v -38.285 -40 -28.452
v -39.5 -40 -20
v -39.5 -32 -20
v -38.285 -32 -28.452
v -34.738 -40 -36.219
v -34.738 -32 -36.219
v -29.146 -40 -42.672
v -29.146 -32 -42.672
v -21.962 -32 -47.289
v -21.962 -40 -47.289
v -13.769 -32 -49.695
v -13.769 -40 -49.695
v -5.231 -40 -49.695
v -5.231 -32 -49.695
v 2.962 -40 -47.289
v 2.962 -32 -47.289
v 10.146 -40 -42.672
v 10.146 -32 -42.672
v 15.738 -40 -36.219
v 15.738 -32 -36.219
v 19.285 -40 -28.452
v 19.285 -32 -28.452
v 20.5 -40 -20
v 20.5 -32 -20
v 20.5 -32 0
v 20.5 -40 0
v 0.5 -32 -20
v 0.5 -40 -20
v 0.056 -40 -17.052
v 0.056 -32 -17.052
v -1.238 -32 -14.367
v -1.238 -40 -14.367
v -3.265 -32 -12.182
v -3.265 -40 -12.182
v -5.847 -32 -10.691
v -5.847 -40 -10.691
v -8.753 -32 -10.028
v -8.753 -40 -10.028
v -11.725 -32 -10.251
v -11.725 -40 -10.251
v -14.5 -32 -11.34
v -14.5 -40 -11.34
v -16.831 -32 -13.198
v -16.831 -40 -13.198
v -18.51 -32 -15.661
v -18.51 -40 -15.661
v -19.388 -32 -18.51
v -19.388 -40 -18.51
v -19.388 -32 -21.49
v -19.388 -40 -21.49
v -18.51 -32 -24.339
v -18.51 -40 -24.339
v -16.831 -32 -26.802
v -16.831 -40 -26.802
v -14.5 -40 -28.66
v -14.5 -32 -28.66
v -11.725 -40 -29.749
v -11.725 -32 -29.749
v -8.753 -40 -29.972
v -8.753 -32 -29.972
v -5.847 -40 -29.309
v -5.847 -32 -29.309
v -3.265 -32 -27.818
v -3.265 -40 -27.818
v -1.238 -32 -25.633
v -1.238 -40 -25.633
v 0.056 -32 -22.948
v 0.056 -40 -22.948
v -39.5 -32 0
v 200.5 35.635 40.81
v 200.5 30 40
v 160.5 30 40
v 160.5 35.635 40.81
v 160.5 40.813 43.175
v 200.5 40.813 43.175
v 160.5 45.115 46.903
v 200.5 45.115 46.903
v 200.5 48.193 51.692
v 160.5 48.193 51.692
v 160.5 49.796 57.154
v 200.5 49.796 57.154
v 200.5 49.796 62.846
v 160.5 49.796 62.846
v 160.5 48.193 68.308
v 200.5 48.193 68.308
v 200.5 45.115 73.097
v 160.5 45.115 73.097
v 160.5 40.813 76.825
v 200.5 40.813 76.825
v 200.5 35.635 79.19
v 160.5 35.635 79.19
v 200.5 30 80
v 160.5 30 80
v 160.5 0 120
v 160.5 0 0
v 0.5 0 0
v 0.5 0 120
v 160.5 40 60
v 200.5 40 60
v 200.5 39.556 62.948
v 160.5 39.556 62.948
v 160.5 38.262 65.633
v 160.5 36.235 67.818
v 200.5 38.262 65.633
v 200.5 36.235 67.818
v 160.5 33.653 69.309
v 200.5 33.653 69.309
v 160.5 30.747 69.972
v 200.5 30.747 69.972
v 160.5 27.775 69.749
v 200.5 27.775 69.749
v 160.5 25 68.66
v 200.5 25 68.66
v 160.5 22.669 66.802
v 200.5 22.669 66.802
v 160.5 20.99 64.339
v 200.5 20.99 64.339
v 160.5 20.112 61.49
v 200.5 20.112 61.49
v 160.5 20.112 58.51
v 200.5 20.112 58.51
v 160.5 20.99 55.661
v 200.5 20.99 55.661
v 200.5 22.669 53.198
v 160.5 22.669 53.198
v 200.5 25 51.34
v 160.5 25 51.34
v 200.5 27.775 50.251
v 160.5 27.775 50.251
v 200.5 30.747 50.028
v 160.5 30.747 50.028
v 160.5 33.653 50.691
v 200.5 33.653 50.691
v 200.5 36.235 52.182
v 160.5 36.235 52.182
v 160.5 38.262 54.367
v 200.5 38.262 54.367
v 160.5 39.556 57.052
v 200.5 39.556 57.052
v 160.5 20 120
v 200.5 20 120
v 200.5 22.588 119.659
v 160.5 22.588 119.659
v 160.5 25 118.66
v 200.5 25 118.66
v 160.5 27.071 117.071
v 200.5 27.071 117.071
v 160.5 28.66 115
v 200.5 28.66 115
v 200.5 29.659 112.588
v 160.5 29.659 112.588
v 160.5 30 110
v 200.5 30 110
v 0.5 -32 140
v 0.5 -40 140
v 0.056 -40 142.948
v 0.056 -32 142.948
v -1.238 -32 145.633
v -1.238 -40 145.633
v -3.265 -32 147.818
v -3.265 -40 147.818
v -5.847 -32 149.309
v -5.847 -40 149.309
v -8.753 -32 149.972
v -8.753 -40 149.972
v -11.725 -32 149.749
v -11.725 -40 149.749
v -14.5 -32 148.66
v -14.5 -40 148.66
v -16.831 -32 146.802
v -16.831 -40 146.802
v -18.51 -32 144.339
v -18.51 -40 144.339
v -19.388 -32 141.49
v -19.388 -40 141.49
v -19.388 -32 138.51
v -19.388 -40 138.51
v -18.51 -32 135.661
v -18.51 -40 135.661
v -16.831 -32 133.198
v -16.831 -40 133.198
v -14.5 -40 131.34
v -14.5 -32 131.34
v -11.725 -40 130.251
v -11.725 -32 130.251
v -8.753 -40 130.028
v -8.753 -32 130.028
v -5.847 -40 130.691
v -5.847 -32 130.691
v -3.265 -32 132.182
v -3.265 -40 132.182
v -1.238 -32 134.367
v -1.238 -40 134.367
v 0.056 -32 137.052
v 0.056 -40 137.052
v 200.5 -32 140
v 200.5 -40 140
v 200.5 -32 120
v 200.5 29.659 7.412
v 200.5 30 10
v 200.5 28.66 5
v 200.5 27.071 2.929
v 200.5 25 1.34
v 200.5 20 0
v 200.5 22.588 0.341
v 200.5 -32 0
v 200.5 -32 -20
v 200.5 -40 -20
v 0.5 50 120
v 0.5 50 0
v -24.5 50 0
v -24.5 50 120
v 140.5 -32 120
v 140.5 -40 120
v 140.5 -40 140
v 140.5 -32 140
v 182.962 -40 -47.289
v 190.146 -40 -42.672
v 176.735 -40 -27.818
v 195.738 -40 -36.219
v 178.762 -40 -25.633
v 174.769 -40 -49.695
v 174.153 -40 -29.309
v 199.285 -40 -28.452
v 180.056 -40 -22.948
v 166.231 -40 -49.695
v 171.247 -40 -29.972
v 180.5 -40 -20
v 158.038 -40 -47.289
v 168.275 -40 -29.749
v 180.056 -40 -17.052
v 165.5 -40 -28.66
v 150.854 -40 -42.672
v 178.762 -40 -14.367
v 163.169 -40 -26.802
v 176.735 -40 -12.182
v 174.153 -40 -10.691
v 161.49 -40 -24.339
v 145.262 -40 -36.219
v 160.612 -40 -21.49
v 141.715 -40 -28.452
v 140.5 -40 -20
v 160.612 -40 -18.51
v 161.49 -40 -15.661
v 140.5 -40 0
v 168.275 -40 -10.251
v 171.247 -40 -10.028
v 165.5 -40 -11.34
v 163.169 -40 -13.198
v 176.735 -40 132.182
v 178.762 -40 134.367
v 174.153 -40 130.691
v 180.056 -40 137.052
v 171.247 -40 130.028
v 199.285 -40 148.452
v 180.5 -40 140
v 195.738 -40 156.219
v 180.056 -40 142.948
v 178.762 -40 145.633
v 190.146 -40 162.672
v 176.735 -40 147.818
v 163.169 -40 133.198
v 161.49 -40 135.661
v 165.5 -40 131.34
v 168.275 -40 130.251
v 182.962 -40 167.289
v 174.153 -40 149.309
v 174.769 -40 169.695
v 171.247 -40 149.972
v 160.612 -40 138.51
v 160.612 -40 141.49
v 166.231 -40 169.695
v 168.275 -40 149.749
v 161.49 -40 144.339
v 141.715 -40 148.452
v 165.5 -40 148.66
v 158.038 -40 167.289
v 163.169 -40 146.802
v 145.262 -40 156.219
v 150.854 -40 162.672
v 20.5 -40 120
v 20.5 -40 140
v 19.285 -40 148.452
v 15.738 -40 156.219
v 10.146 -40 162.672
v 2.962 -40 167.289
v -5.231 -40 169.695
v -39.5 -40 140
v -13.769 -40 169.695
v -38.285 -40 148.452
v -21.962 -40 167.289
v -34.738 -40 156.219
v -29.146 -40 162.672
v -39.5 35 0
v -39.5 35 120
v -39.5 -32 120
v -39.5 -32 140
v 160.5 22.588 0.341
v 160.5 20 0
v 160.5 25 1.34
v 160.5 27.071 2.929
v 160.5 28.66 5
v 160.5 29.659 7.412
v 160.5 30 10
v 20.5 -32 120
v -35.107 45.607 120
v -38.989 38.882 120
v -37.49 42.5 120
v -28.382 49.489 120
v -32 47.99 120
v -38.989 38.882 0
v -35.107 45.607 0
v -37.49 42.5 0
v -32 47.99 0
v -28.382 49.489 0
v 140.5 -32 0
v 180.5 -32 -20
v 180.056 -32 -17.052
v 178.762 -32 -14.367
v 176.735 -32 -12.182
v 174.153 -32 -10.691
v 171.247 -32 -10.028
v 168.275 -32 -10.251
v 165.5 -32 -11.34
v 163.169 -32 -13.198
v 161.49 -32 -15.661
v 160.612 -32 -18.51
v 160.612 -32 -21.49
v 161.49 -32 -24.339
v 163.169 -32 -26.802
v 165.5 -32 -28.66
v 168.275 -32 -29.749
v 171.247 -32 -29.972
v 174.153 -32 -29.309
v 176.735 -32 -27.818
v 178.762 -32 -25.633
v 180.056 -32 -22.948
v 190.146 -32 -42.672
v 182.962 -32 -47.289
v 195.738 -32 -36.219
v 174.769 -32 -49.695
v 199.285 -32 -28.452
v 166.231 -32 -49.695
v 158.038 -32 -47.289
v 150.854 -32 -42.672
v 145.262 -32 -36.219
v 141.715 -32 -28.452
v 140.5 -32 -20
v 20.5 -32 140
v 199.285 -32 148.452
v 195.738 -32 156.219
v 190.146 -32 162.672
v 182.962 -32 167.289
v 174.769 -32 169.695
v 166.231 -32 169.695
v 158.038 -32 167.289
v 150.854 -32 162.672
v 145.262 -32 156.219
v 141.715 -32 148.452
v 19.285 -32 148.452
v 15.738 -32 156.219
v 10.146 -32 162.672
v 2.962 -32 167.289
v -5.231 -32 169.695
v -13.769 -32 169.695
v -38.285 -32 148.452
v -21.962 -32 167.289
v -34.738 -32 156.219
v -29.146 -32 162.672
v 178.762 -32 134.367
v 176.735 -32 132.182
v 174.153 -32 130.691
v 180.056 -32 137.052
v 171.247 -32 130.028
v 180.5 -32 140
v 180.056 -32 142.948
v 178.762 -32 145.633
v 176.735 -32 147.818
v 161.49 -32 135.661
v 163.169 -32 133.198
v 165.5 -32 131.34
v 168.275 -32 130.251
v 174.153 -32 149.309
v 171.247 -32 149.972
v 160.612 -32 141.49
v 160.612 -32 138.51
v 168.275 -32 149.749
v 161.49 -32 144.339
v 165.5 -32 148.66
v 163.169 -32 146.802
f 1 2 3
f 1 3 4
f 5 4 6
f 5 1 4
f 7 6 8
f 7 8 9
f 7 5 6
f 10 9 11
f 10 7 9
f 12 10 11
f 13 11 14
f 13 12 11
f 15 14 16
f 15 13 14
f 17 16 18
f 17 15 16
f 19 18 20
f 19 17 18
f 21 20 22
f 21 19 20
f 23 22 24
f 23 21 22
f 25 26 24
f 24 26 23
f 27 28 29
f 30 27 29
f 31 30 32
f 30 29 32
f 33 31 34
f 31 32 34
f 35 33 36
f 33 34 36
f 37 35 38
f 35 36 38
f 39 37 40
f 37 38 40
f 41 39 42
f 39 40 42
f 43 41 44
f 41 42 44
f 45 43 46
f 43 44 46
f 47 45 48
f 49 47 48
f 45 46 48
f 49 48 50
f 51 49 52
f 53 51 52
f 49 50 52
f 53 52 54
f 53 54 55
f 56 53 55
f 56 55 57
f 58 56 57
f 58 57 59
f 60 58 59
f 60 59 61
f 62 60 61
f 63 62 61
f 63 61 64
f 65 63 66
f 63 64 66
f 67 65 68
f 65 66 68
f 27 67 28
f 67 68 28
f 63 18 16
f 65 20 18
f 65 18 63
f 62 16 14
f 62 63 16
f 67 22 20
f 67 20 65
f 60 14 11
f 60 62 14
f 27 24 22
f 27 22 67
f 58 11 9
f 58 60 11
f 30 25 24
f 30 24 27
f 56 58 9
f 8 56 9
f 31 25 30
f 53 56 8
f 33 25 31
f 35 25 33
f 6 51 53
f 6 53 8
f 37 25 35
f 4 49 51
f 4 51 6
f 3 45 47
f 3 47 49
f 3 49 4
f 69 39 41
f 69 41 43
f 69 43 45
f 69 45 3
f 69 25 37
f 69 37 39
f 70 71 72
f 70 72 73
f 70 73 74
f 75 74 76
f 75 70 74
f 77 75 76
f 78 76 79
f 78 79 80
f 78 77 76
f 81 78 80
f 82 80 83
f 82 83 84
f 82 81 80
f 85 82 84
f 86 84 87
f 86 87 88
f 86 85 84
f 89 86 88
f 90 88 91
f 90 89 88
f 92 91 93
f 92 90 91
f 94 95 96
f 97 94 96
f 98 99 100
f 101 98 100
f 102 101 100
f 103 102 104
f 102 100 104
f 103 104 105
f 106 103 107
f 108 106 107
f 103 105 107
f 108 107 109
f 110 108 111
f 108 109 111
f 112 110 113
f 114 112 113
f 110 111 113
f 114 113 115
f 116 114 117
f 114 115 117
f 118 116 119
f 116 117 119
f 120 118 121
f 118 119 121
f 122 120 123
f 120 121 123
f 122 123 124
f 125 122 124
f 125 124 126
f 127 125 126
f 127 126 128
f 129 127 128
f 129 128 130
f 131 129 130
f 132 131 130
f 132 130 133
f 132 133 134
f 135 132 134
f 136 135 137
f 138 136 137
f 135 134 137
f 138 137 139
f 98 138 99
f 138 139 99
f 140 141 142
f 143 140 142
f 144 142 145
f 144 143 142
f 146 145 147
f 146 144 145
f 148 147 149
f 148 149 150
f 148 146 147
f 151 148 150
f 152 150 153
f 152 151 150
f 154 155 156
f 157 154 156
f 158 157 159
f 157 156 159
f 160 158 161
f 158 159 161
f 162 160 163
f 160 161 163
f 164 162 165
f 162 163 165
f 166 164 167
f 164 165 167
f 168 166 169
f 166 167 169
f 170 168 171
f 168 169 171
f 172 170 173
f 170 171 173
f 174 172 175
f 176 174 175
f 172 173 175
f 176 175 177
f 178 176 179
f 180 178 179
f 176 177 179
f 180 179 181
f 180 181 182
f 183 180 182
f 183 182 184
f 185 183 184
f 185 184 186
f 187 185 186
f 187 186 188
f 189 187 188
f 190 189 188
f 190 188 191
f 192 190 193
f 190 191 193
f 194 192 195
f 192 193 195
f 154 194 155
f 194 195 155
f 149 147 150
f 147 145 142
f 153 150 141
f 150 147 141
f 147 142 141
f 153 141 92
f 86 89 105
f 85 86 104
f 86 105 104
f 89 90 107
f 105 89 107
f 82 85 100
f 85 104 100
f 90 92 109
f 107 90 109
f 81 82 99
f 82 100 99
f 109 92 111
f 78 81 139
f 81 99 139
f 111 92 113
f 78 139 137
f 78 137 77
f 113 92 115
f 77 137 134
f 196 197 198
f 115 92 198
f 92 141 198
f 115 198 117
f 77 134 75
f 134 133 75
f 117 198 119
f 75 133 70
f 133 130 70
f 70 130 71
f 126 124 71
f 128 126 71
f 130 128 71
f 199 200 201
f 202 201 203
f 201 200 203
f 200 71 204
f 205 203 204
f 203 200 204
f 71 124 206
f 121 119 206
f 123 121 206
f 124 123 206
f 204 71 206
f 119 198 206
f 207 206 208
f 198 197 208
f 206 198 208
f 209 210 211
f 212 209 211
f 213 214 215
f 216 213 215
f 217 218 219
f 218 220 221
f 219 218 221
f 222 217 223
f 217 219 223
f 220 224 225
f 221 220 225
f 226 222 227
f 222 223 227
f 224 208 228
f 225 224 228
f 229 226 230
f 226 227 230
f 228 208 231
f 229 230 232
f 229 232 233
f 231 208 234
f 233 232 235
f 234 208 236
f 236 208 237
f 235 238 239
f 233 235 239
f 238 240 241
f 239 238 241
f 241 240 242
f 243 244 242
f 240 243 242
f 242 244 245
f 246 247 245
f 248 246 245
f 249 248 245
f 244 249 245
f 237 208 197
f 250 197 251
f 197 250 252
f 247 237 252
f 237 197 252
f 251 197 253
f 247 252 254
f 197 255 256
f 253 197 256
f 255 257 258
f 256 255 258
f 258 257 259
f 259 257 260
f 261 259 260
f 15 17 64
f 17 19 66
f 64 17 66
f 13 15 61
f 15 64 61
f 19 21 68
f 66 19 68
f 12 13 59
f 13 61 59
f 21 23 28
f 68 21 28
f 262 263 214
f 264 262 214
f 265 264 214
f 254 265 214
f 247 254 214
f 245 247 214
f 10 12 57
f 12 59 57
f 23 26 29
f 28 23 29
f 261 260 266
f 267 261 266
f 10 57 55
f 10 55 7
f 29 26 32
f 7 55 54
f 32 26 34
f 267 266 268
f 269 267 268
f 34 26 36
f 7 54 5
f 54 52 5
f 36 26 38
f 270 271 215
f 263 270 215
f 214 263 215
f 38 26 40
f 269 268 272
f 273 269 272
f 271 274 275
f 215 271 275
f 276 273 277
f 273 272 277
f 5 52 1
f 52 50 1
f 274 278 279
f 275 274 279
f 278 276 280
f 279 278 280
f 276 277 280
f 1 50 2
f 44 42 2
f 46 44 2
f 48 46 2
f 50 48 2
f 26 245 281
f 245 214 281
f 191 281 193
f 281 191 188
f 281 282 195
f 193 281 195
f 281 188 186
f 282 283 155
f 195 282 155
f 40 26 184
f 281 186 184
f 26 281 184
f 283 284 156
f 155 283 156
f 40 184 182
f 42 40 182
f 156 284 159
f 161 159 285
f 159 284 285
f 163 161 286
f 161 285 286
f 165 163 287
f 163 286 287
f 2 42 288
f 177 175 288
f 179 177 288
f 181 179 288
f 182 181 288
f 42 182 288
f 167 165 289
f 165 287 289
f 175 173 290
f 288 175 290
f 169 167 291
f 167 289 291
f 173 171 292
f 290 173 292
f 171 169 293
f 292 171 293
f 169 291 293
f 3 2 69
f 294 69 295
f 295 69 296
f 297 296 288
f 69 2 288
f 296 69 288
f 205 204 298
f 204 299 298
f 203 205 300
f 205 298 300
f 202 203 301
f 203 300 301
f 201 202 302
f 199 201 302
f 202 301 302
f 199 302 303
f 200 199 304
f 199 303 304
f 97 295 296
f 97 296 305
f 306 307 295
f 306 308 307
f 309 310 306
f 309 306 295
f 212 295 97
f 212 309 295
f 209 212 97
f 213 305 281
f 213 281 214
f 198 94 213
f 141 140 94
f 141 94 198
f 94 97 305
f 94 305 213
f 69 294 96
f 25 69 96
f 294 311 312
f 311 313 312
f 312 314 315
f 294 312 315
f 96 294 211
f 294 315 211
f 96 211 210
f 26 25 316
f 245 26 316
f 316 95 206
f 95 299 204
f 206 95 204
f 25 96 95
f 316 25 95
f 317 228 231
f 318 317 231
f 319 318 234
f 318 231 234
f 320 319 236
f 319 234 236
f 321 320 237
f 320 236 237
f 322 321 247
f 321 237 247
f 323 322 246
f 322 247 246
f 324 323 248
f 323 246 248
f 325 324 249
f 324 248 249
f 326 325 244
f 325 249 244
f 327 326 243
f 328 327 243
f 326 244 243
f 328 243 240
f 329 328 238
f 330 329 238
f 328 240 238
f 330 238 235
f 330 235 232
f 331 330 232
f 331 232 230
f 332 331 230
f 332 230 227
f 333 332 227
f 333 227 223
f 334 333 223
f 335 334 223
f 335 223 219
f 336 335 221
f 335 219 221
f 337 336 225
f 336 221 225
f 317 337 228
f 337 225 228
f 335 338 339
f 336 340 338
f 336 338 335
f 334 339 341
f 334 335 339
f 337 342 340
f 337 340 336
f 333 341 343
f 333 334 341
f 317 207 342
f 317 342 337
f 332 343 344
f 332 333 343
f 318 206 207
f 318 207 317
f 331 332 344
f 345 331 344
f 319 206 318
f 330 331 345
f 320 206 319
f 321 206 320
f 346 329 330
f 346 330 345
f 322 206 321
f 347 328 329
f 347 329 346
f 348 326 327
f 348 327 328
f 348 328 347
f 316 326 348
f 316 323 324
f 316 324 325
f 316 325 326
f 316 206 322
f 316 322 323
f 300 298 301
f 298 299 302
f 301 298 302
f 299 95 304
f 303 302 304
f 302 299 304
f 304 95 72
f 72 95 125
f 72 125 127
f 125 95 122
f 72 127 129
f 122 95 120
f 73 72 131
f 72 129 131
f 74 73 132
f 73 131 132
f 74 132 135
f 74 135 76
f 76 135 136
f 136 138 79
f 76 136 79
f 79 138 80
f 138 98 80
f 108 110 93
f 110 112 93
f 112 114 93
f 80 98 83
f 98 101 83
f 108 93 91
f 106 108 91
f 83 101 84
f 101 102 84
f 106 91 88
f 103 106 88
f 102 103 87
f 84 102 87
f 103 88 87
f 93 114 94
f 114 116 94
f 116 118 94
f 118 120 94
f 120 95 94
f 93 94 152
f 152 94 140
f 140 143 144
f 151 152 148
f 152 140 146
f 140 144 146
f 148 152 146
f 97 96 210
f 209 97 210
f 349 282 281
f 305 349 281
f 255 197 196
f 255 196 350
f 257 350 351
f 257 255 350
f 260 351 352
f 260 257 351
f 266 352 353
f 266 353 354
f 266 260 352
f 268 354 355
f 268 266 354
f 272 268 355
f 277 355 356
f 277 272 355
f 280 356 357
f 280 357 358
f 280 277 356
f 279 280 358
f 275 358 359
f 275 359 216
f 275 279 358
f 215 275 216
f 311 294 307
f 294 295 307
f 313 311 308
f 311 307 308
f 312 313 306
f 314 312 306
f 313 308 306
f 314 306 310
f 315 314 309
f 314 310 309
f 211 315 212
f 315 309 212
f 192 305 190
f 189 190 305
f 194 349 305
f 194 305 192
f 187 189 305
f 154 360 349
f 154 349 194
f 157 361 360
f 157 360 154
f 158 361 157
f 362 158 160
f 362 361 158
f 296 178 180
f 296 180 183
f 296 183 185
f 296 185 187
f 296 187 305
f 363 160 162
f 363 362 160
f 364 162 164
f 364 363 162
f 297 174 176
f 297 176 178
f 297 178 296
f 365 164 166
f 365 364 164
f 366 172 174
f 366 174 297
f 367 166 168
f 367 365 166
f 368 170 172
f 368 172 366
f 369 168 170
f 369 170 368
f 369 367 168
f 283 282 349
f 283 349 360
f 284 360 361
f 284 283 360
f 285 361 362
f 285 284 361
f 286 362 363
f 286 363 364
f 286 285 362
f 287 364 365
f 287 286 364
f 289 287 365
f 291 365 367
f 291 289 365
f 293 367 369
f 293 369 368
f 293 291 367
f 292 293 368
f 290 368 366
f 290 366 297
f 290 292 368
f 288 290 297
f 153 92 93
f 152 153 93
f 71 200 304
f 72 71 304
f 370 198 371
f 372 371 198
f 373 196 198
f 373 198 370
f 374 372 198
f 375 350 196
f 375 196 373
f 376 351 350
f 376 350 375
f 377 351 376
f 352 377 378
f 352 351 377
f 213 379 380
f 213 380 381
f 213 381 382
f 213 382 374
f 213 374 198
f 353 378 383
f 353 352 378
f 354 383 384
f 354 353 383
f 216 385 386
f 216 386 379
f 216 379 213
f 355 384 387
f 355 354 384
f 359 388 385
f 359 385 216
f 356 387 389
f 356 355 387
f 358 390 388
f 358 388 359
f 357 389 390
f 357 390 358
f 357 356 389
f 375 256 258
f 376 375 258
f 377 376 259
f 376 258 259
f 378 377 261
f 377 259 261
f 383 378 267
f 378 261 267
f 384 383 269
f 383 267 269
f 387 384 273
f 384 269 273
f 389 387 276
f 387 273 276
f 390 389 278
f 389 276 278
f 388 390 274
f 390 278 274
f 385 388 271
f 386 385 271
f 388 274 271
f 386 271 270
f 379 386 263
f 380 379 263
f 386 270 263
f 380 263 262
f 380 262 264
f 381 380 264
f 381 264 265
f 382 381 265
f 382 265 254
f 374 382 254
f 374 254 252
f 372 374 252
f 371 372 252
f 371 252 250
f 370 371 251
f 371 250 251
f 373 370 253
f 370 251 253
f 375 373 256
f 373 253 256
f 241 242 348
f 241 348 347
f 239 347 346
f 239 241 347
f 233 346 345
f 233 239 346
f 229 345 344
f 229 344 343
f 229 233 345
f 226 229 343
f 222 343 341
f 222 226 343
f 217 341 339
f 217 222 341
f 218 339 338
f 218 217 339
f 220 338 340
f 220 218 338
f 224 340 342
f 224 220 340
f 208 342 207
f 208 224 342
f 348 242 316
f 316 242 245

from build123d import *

# Parameters (mm, degrees)
PAD_DEPTH       = 120
FILLET_R        = 15
FILLET001_R     = 10
SKETCH001_R     = 20
PAD001_DEPTH    = 40
SKETCH002_R     = 10
POCKET_DEPTH    = 40
PAD002_DEPTH    = 8
SKETCH004_R     = 10
POCKET001_DEPTH = 8
PAD003_DEPTH    = 8
SKETCH006_R     = 10
POCKET002_DEPTH = 8
PAD004_DEPTH    = 8
SKETCH008_R     = 10
POCKET003_DEPTH = 8


with BuildPart() as part:
    # Sketch → Pad (new body)
    with BuildSketch(Plane.XY):
        Polygon((-39.5, 50), (-39.5, -40), (200.5, -40), (200.5, 30), (160.5, 30), (160.5, 0), (0.5, 0), (0.5, 50), align=None)
    extrude(amount=PAD_DEPTH)

    # Fillet
    fillet_edges = [part.edges().sort_by_distance(p)[0] for p in [
        (-39.5, 50, 60),
    ]]
    fillet(fillet_edges, radius=FILLET_R)

    # Fillet001
    fillet001_edges = [part.edges().sort_by_distance(p)[0] for p in [
        (180.5, 30, 120),
        (180.5, 30, 0),
    ]]
    fillet(fillet001_edges, radius=FILLET001_R)

    # Sketch001 (on Face2 of Fillet001) → Pad001 (join)
    with BuildSketch(Plane.YZ.offset(200.5)):
        with Locations((30, 60)):
            Circle(SKETCH001_R)
    extrude(amount=-PAD001_DEPTH)

    # Sketch002 (on Face12 of Pad001) → Pocket (cut)
    with BuildSketch(Plane.YZ.offset(200.5)):
        with Locations((30, 60)):
            Circle(SKETCH002_R)
    extrude(amount=-POCKET_DEPTH, mode=Mode.SUBTRACT)

    # Sketch003 (on Face4 of Pocket) → Pad002 (join)
    with BuildSketch(Plane.XZ.offset(40)):
        with BuildLine():
            Line((20.5, 140.000001), (20.5, 120))
            Line((20.5, 120), (-39.5, 120))
            Line((-39.5, 120), (-39.5, 140))
            ThreePointArc((20.5, 140.000001), (-9.5, 170), (-39.5, 140))
        make_face()
    extrude(amount=-PAD002_DEPTH)

    # Sketch004 (on Face16 of Pad002) → Pocket001 (cut)
    with BuildSketch(Plane.XZ.offset(40)):
        with Locations((-9.5, 140)):
            Circle(SKETCH004_R)
    extrude(amount=-POCKET001_DEPTH, mode=Mode.SUBTRACT)

    # Sketch005 (on Face4 of Pocket001) → Pad003 (join)
    with BuildSketch(Plane.XZ.offset(40)):
        with BuildLine():
            Line((200.5, 140), (200.5, 120))
            Line((200.5, 120), (140.5, 120))
            Line((140.5, 120), (140.5, 139.999999))
            ThreePointArc((200.5, 140), (170.5, 169.999999), (140.5, 139.999999))
        make_face()
    extrude(amount=-PAD003_DEPTH)

    # Sketch006 (on Face18 of Pad003) → Pocket002 (cut)
    with BuildSketch(Plane.XZ.offset(40)):
        with Locations((170.5, 139.999999)):
            Circle(SKETCH006_R)
    extrude(amount=-POCKET002_DEPTH, mode=Mode.SUBTRACT)

    # Sketch007 (on Face4 of Pocket002) → Pad004 (join)
    with BuildSketch(Plane.XZ.offset(40)):
        with BuildLine():
            Line((-39.5, 0), (20.5, 0))
            Line((20.5, 0), (20.5, -20))
            ThreePointArc((-39.5, -20), (-9.5, -50), (20.5, -20))
            Line((-39.5, -20), (-39.5, 0))
        make_face()
        with BuildLine():
            Line((140.5, 0), (200.5, 0))
            Line((200.5, 0), (200.5, -20))
            ThreePointArc((140.5, -20), (170.5, -49.99997), (200.5, -20))
            Line((140.5, -20), (140.5, 0))
        make_face()
    extrude(amount=-PAD004_DEPTH)

    # Sketch008 (on Face4 of Pad004) → Pocket003 (cut)
    with BuildSketch(Plane.XZ.offset(40)):
        with Locations((-9.5, -20)):
            Circle(SKETCH008_R)
        with Locations((170.5, -19.99997)):
            Circle(SKETCH008_R)
    extrude(amount=-POCKET003_DEPTH, mode=Mode.SUBTRACT)


solid = part.part
